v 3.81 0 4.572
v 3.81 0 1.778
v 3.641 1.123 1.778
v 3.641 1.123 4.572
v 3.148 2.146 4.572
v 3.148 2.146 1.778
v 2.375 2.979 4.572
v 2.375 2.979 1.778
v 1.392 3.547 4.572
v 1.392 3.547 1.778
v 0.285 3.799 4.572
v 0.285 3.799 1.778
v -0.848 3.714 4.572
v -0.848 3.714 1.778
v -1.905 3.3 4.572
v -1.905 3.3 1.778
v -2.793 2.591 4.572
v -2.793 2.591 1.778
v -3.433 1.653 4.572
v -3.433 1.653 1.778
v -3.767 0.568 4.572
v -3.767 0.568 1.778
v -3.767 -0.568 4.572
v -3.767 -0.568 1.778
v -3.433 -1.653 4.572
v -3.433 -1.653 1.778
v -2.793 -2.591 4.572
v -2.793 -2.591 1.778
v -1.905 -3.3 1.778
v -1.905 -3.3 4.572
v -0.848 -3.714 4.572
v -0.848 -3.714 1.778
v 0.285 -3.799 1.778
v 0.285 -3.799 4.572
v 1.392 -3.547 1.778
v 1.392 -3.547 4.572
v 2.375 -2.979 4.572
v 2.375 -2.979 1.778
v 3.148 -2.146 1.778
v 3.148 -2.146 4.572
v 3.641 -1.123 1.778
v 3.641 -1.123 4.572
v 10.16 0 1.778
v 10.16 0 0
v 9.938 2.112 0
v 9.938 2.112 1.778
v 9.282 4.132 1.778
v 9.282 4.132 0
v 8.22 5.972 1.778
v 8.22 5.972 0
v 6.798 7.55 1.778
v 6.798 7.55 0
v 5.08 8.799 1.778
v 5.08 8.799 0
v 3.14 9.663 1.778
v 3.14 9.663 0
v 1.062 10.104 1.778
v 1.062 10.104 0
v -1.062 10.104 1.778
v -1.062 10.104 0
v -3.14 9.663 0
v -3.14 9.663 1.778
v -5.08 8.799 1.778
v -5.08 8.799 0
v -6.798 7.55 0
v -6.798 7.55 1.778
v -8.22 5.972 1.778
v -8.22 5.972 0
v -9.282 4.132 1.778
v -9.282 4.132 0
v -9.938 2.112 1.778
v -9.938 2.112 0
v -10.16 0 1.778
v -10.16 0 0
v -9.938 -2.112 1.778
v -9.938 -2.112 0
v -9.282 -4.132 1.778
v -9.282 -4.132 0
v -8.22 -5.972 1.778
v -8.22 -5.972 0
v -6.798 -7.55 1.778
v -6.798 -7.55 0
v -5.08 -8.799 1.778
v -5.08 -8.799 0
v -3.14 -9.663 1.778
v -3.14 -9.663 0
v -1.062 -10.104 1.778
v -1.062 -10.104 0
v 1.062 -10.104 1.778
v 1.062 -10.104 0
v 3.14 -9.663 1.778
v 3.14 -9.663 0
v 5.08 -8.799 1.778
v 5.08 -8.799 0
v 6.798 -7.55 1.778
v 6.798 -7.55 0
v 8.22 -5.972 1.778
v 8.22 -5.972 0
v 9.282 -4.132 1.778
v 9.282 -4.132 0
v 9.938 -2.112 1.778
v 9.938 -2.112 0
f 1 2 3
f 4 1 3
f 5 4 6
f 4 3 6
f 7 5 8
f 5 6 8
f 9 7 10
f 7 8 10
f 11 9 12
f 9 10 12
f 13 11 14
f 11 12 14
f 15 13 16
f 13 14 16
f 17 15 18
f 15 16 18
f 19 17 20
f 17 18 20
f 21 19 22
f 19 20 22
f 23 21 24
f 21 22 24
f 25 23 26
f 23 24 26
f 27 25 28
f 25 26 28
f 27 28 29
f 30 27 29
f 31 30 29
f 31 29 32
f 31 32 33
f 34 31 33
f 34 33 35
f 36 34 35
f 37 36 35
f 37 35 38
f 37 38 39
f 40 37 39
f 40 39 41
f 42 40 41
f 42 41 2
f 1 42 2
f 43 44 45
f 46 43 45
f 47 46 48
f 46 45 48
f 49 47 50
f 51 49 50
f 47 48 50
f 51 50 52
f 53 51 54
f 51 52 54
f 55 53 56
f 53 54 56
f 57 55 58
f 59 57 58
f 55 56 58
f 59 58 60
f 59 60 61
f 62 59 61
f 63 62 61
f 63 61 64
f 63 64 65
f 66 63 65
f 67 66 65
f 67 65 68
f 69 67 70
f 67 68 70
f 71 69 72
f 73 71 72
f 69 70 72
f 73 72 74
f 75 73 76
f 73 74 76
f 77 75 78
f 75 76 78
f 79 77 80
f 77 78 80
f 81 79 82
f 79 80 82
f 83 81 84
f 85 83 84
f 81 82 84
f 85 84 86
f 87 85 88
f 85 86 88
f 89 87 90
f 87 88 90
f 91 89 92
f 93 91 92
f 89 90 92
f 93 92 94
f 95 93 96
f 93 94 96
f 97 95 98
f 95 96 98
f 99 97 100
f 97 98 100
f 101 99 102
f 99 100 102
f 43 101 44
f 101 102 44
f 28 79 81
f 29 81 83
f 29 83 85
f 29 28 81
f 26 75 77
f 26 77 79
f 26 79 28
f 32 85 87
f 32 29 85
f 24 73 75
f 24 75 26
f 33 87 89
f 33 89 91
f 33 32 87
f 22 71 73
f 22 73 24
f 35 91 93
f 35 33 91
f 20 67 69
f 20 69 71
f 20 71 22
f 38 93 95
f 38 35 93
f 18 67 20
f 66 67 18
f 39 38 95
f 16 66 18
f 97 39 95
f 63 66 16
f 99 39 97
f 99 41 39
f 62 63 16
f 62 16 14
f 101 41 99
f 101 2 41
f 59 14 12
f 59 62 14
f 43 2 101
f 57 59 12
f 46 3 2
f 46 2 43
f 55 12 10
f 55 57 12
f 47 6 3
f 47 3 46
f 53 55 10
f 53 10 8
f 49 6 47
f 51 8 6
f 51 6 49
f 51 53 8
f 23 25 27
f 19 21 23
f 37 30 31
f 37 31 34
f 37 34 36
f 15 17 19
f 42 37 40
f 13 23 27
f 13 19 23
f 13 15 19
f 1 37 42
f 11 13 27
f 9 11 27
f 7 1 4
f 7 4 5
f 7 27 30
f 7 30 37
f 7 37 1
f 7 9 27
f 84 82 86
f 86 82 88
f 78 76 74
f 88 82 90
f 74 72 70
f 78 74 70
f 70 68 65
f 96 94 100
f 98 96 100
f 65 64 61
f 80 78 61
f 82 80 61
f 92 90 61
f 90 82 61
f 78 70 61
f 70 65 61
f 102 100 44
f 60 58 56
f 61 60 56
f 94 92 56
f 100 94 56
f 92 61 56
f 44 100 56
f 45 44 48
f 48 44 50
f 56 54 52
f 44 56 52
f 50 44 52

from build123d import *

# Parameters (mm, degrees)
SKETCH2_R           = 10.16
SKETCH2_R_2         = 3.81
BOSS_EXTRUDE1_DEPTH = 1.778
SKETCH2_3_R         = 10.16
SKETCH2_3_R_2       = 3.81
BOSS_EXTRUDE2_DEPTH = 1.778
SKETCH2_4_R         = 3.81
BOSS_EXTRUDE3_DEPTH = 4.572


with BuildPart() as part:
    # Sketch2 → Boss-Extrude1 (new body)
    with BuildSketch(Plane.XY):
        Circle(SKETCH2_R)
        Circle(SKETCH2_R_2, mode=Mode.SUBTRACT)
    extrude(amount=BOSS_EXTRUDE1_DEPTH)

    # Sketch2<3> → Boss-Extrude2 (add)
    with BuildSketch(Plane.XY):
        Circle(SKETCH2_3_R)
        Circle(SKETCH2_3_R_2, mode=Mode.SUBTRACT)
    extrude(amount=BOSS_EXTRUDE2_DEPTH)

    # Sketch2<4> → Boss-Extrude3 (add)
    with BuildSketch(Plane.XY):
        Circle(SKETCH2_4_R)
    extrude(amount=BOSS_EXTRUDE3_DEPTH)


solid = part.part
